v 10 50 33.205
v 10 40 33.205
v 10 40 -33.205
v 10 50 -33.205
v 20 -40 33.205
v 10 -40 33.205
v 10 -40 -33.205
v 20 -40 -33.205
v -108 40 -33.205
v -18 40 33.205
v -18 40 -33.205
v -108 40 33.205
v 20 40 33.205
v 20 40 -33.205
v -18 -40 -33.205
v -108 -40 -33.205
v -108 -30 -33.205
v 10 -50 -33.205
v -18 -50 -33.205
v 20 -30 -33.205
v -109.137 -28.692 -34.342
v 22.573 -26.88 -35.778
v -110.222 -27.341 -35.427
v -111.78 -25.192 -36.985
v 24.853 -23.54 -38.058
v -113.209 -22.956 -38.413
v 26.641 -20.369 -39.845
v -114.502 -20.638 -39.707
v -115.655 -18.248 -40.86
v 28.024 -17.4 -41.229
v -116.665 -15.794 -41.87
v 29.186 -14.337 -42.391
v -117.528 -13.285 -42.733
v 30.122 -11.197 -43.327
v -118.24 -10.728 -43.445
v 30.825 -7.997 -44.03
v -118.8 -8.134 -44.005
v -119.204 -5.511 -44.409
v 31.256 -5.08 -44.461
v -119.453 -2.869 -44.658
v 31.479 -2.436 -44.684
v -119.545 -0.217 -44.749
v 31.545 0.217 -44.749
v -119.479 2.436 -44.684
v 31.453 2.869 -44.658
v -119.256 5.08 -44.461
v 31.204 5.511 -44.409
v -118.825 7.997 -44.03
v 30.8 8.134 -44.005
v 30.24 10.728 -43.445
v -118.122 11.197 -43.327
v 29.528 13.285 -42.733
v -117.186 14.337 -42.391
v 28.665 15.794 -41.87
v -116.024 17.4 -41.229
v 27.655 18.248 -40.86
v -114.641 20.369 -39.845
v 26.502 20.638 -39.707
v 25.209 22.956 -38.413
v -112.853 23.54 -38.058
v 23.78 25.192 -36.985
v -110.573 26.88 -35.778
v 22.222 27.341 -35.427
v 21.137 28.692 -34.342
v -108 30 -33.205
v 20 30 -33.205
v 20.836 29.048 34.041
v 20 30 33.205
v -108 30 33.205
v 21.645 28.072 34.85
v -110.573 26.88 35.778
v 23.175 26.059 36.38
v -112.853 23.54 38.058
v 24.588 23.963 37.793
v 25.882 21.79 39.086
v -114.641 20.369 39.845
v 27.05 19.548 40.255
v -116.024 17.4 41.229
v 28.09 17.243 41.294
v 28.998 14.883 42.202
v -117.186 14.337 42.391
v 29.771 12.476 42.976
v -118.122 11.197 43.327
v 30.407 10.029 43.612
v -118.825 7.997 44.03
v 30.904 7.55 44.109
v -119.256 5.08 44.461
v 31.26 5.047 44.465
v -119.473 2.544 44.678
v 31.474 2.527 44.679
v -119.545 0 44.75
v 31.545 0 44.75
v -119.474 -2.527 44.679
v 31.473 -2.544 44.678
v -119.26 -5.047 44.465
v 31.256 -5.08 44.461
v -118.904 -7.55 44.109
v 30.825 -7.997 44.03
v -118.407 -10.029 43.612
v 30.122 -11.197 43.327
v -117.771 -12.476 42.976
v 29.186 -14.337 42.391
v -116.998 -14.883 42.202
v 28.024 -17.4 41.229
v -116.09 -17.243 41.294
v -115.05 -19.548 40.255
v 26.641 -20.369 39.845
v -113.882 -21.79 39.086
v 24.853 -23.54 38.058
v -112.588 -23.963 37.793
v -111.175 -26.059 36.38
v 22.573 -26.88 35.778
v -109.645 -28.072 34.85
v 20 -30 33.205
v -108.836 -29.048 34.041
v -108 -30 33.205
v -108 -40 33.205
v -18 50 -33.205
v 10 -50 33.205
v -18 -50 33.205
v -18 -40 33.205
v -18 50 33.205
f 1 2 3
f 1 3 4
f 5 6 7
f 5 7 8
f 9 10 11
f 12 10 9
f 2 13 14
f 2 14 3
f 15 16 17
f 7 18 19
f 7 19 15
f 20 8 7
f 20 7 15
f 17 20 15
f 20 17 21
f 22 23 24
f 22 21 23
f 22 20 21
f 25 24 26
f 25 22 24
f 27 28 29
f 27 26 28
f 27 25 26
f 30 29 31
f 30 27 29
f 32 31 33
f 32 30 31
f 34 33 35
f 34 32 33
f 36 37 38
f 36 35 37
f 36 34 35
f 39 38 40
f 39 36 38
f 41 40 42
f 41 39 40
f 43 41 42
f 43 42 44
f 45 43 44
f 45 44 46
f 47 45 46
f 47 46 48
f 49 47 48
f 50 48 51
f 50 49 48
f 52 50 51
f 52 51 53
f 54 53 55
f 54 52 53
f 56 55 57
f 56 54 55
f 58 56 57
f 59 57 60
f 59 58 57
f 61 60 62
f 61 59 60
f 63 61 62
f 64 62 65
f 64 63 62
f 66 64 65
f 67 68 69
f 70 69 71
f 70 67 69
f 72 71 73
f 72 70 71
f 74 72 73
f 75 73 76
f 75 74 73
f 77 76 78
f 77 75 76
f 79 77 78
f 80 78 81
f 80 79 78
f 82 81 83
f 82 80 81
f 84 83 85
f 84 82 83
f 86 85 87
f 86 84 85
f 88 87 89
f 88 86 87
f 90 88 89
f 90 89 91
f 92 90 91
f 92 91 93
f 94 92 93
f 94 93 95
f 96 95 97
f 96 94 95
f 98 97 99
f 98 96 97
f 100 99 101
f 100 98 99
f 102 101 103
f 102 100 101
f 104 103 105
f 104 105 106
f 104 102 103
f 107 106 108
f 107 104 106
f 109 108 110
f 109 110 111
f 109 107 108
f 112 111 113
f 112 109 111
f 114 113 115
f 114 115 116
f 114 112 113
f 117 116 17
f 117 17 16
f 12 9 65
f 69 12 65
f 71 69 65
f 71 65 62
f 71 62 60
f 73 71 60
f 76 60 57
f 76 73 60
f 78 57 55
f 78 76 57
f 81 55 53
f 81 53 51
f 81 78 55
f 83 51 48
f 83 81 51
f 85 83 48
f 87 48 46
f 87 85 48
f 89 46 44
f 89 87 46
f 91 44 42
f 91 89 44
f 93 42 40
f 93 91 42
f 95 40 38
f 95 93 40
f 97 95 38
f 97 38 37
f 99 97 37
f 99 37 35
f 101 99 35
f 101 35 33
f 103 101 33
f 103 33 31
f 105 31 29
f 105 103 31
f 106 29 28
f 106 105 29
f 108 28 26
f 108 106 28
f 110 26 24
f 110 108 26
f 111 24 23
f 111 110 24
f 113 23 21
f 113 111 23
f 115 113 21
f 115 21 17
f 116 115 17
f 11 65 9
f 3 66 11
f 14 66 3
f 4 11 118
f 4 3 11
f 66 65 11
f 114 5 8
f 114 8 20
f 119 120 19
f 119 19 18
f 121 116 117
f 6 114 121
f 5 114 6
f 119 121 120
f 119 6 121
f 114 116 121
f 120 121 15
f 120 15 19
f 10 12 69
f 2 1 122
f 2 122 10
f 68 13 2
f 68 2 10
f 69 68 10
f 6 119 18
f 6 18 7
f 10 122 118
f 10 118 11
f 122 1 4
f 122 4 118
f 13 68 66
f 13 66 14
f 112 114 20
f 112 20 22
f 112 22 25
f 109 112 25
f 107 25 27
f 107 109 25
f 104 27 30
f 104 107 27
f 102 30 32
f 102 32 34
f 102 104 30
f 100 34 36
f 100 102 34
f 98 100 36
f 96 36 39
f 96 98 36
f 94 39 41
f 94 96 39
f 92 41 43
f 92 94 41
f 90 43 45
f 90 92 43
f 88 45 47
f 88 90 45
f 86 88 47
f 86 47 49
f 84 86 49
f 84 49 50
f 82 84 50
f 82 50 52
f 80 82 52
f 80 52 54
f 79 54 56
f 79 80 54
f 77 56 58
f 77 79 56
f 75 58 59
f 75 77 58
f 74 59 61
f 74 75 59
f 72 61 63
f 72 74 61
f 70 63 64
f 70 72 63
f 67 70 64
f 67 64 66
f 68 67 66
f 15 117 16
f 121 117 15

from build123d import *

# Parameters (mm, degrees)
PAD_DEPTH    = 150
PAD001_DEPTH = 100


with BuildPart() as body:
    # Sketch → Pad (new body, symmetric)
    with BuildSketch(Plane.YZ):
        with BuildLine():
            ThreePointArc((30, 33.204857), (0, 44.75), (-30, 33.204857))
            Line((-30, 33.204857), (-50, 33.204857))
            Line((-50, 33.204857), (-50, -33.204857))
            Line((-50, -33.204857), (-30, -33.204857))
            ThreePointArc((-30, -33.204857), (0, -44.75), (30, -33.204857))
            Line((30, -33.204857), (50, -33.204857))
            Line((50, -33.204857), (50, 33.204857))
            Line((50, 33.204857), (30, 33.204857))
        make_face()
    extrude(amount=PAD_DEPTH, both=True)


with BuildPart() as body001:
    # Sketch001 → Pad001 (new body, symmetric)
    with BuildSketch(Plane.XY):
        with BuildLine():
            ThreePointArc((20, -30), (31.545143, 0), (20, 30))
            Line((20, 30), (20, 40))
            Line((20, 40), (10, 40))
            Line((10, 40), (10, 50))
            Line((10, 50), (-18, 50))
            Line((-18, 50), (-18, 40))
            Line((-18, 40), (-108, 40))
            Line((-108, 40), (-108, 30))
            ThreePointArc((-108, 30), (-119.545143, 0), (-108, -30))
            Line((-108, -30), (-108, -40))
            Line((-108, -40), (-18, -40))
            Line((-18, -40), (-18, -50))
            Line((-18, -50), (10, -50))
            Line((10, -50), (10, -40))
            Line((10, -40), (20, -40))
            Line((20, -40), (20, -30))
        make_face()
    extrude(amount=PAD001_DEPTH, both=True)

    # Boolean: intersect Body
    add(body.part, mode=Mode.INTERSECT)


solid = body001.part
